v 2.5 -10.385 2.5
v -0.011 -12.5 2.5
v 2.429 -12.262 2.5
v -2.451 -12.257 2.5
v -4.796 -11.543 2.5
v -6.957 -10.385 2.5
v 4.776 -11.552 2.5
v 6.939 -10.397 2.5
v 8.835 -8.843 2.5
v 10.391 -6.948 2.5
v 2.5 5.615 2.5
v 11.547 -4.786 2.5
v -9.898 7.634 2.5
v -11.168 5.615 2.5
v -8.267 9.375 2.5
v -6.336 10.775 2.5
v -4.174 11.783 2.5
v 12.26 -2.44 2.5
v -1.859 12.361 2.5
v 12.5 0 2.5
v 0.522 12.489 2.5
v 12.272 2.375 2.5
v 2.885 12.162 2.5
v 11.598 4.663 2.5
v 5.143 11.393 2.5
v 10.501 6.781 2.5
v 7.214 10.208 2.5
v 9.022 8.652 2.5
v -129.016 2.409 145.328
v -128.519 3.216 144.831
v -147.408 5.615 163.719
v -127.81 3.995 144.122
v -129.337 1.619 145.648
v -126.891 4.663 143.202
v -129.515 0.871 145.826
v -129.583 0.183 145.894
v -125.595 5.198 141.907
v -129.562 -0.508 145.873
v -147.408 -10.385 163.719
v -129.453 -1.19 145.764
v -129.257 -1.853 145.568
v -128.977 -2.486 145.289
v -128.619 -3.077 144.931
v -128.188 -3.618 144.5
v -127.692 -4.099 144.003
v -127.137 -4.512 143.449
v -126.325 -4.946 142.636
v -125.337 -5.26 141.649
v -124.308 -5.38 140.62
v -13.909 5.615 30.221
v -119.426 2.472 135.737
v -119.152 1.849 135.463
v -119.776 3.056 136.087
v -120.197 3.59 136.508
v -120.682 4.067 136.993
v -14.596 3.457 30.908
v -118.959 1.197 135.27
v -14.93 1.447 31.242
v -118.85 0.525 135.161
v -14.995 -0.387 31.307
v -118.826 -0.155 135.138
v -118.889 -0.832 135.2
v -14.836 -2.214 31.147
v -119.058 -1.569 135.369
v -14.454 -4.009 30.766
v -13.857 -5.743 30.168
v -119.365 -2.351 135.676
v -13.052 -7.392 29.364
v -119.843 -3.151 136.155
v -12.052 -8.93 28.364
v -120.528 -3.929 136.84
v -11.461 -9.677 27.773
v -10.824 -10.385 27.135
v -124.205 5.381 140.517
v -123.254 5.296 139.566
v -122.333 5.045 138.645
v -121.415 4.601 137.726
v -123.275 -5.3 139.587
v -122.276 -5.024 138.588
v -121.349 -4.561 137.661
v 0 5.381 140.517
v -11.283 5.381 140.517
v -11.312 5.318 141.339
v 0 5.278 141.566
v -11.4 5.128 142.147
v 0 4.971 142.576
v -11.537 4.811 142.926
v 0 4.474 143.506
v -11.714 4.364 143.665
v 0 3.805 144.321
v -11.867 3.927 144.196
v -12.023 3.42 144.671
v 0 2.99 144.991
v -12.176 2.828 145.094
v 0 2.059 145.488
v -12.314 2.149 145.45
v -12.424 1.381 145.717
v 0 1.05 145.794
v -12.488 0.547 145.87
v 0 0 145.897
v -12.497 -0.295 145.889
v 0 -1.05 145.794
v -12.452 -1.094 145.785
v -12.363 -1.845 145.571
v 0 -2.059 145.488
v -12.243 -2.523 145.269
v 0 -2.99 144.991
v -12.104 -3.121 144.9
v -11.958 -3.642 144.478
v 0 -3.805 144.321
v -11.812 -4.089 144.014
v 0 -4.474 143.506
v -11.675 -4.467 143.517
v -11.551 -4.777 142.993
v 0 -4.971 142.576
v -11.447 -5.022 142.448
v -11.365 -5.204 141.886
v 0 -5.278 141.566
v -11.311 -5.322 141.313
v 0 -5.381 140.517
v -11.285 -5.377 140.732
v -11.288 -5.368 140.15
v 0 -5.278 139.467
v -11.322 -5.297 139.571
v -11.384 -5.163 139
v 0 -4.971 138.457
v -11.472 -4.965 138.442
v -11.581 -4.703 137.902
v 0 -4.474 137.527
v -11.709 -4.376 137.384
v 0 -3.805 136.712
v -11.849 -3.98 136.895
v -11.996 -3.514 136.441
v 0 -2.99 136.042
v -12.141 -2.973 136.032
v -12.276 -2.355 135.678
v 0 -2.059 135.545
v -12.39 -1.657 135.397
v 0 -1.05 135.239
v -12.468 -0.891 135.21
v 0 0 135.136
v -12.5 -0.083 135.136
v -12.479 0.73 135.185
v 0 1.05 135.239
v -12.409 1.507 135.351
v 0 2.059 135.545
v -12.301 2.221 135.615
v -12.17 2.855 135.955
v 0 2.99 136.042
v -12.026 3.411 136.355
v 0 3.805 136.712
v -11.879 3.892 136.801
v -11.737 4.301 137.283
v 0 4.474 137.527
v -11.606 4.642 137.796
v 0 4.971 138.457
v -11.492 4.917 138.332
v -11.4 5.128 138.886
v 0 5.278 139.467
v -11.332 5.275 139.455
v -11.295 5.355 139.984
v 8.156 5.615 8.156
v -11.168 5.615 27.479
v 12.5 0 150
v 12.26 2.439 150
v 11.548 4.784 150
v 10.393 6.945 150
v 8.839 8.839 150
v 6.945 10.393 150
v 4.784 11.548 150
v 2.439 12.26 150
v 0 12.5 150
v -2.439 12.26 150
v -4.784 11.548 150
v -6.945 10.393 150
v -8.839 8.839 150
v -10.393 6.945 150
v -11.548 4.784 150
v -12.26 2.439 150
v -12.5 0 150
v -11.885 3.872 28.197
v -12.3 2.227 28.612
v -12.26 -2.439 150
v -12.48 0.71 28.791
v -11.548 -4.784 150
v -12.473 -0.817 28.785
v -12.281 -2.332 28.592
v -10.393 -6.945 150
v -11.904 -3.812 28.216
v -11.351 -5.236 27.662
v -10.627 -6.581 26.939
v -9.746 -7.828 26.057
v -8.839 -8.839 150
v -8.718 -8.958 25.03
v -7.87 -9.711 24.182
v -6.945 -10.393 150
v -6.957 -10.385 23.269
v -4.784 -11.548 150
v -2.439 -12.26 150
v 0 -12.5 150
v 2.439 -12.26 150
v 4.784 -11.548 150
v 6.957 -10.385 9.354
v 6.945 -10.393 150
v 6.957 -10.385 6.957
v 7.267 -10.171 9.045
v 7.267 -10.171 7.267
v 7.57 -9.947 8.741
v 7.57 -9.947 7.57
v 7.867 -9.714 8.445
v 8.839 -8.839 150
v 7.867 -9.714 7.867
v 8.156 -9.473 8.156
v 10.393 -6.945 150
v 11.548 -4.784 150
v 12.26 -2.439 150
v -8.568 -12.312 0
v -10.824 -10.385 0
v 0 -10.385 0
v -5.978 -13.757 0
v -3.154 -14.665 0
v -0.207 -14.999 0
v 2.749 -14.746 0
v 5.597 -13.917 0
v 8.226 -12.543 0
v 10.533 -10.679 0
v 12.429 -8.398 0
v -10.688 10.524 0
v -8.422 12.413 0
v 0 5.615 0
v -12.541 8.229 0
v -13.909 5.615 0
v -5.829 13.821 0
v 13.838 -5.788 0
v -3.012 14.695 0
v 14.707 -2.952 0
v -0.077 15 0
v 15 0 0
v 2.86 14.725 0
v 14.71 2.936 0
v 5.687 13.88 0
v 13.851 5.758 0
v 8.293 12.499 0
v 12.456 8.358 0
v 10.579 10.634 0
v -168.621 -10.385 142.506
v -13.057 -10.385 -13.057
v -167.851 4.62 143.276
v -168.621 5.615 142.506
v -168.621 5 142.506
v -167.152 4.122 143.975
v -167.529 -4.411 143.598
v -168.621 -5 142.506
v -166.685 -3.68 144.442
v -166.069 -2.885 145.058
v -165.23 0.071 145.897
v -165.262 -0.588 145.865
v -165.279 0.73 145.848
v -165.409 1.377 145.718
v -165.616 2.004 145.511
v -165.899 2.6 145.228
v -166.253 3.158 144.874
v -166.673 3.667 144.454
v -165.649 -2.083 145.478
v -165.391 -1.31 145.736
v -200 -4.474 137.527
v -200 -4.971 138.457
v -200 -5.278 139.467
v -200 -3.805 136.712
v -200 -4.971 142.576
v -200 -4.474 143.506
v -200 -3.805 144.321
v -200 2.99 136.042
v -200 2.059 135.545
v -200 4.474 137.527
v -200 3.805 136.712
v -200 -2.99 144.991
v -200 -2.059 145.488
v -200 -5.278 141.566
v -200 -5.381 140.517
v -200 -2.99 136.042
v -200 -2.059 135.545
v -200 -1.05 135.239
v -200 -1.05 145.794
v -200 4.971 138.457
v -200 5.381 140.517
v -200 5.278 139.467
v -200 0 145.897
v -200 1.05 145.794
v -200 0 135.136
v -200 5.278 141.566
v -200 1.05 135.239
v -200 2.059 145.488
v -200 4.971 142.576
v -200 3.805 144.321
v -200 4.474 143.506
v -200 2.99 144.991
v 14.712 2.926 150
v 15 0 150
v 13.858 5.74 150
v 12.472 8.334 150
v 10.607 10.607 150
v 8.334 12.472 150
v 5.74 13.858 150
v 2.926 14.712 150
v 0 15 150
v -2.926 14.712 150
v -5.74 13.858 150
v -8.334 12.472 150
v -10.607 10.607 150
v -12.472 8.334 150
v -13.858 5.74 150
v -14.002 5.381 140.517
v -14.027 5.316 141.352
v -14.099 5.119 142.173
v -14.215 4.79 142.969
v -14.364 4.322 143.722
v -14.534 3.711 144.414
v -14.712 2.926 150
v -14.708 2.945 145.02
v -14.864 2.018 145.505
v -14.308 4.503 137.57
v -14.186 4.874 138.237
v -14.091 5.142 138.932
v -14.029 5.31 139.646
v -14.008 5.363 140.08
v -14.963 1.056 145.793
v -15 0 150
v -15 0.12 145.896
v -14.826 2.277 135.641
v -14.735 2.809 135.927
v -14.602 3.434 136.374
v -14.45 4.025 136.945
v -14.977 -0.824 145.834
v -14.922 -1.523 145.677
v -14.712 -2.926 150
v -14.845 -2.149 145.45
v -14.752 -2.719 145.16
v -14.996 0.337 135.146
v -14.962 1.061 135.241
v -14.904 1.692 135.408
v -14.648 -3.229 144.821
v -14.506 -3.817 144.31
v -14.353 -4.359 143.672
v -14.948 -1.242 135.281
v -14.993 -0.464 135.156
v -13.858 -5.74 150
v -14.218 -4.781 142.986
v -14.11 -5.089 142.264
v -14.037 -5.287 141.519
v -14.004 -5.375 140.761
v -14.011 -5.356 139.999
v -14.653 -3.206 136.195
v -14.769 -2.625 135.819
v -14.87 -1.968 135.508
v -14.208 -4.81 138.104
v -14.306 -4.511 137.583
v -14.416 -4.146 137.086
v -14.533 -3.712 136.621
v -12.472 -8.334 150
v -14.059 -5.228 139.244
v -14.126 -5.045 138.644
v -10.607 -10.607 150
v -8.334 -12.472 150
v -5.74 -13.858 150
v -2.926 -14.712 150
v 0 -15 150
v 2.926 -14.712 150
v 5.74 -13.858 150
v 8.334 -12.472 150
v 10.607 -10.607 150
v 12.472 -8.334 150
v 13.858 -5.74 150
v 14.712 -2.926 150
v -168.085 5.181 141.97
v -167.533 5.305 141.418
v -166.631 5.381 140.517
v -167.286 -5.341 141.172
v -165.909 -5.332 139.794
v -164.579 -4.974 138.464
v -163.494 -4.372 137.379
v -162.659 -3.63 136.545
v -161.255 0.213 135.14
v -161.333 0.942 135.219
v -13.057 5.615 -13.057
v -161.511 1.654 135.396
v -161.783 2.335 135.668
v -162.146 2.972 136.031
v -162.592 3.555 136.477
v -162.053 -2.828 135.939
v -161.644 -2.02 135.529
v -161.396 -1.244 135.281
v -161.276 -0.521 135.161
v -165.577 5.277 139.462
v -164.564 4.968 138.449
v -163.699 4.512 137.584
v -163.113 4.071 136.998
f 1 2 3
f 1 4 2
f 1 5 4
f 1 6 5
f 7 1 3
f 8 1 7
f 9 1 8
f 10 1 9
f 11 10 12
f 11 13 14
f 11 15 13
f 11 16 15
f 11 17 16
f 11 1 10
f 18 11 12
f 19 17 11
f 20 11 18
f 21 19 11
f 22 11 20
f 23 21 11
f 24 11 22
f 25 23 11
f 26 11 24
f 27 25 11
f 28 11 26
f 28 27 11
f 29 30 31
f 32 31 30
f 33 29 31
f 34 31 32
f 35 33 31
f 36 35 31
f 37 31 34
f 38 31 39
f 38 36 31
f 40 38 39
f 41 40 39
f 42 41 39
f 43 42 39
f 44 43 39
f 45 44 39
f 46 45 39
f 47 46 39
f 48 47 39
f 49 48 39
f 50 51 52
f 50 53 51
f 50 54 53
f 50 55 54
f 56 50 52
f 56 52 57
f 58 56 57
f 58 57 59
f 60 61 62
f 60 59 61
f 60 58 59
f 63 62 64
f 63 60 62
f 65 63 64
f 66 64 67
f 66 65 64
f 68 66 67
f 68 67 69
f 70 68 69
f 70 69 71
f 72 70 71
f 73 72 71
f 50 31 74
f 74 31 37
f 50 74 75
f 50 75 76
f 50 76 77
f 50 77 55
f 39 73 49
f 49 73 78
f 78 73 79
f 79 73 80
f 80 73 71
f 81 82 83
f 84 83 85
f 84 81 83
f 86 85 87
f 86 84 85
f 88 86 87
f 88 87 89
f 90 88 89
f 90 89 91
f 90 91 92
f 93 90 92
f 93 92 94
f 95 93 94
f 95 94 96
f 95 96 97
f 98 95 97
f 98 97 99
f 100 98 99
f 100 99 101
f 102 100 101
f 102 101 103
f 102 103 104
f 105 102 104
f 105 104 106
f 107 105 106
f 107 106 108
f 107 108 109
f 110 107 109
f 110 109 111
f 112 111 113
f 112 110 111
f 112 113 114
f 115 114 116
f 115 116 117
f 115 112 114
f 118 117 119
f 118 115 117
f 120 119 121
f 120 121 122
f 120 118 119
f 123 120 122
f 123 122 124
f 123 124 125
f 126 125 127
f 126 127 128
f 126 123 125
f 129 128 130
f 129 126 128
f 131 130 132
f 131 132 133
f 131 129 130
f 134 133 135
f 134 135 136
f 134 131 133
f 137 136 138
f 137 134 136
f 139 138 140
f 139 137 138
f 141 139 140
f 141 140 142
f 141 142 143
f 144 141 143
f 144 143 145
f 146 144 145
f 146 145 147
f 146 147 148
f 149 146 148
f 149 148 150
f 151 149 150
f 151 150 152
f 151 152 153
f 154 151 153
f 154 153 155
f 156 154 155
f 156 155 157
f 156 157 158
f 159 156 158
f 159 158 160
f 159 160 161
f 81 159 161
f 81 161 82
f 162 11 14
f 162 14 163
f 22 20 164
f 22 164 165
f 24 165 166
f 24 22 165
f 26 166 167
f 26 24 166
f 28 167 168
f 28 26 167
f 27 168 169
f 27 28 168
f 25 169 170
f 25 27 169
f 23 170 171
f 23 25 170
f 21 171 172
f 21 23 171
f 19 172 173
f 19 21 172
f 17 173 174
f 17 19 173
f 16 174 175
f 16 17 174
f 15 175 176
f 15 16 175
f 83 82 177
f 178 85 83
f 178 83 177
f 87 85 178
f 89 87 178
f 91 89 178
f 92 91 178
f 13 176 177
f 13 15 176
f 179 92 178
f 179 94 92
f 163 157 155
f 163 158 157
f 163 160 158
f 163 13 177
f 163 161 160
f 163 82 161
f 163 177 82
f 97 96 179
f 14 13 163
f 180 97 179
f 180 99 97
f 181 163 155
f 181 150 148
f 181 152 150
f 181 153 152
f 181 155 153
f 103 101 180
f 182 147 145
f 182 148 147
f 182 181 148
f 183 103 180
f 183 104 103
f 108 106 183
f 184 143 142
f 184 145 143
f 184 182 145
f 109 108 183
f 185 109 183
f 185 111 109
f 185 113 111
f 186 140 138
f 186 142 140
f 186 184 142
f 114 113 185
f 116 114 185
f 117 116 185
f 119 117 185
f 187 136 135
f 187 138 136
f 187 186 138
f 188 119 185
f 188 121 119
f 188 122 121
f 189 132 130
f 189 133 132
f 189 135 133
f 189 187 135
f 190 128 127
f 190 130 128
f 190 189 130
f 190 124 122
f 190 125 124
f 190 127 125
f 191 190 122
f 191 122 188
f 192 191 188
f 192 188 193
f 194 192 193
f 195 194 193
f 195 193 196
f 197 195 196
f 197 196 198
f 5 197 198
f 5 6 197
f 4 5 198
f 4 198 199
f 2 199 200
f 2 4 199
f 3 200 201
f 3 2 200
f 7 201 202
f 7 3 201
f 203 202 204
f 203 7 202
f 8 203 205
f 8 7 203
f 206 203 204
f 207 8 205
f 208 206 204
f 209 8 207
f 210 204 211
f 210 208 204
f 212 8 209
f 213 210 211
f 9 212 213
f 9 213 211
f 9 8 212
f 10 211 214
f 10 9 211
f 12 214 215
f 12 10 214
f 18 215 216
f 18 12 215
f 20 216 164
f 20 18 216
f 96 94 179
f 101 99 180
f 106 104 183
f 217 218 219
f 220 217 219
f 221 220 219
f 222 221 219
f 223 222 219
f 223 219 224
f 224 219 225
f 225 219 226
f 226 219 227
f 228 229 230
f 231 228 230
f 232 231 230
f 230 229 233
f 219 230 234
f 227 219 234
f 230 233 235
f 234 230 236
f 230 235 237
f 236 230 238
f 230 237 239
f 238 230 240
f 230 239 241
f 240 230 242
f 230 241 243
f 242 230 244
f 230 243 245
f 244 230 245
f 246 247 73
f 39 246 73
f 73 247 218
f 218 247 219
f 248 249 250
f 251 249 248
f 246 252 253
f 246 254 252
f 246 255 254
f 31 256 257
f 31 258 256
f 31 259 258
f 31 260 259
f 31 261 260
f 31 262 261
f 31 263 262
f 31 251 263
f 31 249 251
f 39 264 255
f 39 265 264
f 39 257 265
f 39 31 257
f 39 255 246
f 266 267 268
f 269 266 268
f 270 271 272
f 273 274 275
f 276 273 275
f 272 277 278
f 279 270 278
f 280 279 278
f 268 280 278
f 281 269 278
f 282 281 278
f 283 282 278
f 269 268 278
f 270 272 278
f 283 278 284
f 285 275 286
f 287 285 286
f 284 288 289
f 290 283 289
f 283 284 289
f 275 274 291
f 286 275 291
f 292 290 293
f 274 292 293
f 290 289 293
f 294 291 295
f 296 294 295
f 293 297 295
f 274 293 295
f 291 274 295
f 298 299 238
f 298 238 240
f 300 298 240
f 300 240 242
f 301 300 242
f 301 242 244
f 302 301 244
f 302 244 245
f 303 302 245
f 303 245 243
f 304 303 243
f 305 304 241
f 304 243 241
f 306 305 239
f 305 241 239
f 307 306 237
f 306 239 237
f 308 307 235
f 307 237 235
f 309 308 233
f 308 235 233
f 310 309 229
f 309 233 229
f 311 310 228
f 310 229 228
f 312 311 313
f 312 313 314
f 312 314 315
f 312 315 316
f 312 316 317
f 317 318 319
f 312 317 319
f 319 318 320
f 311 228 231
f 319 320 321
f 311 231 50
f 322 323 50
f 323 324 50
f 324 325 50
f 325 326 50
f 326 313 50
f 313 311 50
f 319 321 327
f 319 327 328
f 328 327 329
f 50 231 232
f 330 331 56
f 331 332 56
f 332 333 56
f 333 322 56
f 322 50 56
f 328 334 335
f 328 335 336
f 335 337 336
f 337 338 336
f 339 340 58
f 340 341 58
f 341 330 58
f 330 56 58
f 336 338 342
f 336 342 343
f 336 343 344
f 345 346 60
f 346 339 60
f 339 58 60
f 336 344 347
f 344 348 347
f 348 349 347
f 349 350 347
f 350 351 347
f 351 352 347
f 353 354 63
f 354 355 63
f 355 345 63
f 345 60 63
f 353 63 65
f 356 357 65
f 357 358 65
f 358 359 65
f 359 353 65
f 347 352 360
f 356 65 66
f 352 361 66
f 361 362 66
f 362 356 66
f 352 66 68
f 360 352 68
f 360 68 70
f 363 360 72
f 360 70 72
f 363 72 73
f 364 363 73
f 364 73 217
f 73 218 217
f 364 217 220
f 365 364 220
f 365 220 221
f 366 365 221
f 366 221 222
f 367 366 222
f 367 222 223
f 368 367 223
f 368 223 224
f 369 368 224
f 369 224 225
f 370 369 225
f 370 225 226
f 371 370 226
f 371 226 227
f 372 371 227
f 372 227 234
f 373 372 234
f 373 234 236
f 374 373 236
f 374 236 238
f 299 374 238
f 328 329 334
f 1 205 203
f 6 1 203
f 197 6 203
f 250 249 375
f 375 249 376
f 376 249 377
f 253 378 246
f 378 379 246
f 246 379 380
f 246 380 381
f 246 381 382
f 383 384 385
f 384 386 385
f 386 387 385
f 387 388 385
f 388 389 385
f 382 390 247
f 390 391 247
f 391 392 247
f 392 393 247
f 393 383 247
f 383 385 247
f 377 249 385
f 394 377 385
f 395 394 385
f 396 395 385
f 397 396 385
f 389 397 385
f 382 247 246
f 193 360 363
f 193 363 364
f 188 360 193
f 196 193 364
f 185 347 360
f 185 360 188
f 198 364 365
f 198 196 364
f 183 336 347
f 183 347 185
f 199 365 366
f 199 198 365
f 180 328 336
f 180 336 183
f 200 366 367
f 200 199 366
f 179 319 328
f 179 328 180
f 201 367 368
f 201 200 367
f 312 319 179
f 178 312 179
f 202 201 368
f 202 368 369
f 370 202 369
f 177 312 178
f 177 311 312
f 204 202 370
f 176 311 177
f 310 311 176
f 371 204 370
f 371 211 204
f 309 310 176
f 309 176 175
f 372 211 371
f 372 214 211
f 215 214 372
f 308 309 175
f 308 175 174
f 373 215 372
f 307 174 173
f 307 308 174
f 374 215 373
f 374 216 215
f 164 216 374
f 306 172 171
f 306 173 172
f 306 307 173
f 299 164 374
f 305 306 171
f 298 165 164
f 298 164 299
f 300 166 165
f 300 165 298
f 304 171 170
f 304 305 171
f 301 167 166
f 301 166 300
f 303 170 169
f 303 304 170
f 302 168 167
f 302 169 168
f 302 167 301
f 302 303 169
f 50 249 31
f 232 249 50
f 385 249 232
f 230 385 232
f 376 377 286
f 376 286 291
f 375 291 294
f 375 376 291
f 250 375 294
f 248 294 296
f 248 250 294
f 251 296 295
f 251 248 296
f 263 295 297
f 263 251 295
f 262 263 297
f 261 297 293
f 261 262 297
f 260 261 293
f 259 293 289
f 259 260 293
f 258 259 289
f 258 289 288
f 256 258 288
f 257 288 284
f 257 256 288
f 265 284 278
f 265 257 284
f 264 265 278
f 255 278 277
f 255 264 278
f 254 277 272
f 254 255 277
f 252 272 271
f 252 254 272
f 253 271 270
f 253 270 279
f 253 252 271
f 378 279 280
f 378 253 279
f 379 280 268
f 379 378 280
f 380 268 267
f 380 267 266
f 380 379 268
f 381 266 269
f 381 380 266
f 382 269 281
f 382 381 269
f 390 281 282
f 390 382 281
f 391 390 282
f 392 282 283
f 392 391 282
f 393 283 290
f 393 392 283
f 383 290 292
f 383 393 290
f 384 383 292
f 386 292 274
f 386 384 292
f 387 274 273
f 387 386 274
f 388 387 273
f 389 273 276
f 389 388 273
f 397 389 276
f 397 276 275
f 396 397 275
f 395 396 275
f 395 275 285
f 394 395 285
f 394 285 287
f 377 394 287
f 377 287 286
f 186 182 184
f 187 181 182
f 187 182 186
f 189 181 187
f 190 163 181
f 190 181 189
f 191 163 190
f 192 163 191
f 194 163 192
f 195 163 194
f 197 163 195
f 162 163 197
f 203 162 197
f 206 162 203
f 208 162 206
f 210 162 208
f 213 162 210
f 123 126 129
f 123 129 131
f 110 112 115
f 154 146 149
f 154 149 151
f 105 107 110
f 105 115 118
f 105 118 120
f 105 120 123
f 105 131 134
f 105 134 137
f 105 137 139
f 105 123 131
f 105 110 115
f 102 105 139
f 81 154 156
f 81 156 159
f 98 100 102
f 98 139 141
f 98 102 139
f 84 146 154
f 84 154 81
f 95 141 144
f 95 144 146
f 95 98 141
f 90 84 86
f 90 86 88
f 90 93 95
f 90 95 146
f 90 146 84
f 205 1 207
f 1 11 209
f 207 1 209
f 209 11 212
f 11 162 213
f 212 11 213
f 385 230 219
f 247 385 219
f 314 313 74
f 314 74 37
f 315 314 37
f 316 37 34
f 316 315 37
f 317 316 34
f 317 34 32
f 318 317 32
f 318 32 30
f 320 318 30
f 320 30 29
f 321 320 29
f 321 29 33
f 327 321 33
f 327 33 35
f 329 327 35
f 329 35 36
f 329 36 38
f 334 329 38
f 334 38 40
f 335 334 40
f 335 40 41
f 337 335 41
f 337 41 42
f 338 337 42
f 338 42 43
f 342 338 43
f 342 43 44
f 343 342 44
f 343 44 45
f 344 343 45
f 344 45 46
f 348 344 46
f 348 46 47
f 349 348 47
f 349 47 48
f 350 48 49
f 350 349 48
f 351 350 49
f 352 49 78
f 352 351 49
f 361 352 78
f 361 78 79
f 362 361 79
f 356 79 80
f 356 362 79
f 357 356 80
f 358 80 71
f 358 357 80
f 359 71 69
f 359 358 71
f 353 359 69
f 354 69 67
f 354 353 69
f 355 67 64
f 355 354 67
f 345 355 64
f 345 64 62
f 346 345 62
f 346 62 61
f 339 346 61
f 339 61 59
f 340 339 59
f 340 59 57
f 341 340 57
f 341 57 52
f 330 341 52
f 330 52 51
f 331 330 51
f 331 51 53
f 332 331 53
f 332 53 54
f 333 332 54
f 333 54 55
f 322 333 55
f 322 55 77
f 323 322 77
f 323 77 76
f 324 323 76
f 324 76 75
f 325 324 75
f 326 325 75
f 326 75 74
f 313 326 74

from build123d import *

# Parameters (mm, degrees)
F0_R     = 15
F1_DEPTH = 150
F2_T     = -2.5
F5_W     = 16
F5_H     = 30
F6_DEPTH = 220
F7_R     = 5.38096
F8_DEPTH = 200


with BuildPart() as f1:
    # F0 (on Top) → F1 (new body)
    with BuildSketch(Plane.XY):
        Circle(F0_R)
    extrude(amount=F1_DEPTH)

    # F2
    f2_openings = [f1.faces().sort_by_distance(p)[0] for p in [
        (0, 0, 150),
    ]]
    offset(amount=F2_T, openings=f2_openings)

    # F5 (on face) → F6 (join)
    with BuildSketch(Plane(origin=(0, 0, 0), x_dir=(0, -1, 0), z_dir=(-0.707107, 0, 0.707107))):
        with Locations((2.385001, -3.465989)):
            Rectangle(F5_W, F5_H)
    extrude(amount=F6_DEPTH)

    # F7 (on Right) → F8 (join)
    with BuildSketch(Plane.YZ):
        with Locations((0, 140.51652)):
            Circle(F7_R)
    extrude(amount=-F8_DEPTH)


solid = f1.part
